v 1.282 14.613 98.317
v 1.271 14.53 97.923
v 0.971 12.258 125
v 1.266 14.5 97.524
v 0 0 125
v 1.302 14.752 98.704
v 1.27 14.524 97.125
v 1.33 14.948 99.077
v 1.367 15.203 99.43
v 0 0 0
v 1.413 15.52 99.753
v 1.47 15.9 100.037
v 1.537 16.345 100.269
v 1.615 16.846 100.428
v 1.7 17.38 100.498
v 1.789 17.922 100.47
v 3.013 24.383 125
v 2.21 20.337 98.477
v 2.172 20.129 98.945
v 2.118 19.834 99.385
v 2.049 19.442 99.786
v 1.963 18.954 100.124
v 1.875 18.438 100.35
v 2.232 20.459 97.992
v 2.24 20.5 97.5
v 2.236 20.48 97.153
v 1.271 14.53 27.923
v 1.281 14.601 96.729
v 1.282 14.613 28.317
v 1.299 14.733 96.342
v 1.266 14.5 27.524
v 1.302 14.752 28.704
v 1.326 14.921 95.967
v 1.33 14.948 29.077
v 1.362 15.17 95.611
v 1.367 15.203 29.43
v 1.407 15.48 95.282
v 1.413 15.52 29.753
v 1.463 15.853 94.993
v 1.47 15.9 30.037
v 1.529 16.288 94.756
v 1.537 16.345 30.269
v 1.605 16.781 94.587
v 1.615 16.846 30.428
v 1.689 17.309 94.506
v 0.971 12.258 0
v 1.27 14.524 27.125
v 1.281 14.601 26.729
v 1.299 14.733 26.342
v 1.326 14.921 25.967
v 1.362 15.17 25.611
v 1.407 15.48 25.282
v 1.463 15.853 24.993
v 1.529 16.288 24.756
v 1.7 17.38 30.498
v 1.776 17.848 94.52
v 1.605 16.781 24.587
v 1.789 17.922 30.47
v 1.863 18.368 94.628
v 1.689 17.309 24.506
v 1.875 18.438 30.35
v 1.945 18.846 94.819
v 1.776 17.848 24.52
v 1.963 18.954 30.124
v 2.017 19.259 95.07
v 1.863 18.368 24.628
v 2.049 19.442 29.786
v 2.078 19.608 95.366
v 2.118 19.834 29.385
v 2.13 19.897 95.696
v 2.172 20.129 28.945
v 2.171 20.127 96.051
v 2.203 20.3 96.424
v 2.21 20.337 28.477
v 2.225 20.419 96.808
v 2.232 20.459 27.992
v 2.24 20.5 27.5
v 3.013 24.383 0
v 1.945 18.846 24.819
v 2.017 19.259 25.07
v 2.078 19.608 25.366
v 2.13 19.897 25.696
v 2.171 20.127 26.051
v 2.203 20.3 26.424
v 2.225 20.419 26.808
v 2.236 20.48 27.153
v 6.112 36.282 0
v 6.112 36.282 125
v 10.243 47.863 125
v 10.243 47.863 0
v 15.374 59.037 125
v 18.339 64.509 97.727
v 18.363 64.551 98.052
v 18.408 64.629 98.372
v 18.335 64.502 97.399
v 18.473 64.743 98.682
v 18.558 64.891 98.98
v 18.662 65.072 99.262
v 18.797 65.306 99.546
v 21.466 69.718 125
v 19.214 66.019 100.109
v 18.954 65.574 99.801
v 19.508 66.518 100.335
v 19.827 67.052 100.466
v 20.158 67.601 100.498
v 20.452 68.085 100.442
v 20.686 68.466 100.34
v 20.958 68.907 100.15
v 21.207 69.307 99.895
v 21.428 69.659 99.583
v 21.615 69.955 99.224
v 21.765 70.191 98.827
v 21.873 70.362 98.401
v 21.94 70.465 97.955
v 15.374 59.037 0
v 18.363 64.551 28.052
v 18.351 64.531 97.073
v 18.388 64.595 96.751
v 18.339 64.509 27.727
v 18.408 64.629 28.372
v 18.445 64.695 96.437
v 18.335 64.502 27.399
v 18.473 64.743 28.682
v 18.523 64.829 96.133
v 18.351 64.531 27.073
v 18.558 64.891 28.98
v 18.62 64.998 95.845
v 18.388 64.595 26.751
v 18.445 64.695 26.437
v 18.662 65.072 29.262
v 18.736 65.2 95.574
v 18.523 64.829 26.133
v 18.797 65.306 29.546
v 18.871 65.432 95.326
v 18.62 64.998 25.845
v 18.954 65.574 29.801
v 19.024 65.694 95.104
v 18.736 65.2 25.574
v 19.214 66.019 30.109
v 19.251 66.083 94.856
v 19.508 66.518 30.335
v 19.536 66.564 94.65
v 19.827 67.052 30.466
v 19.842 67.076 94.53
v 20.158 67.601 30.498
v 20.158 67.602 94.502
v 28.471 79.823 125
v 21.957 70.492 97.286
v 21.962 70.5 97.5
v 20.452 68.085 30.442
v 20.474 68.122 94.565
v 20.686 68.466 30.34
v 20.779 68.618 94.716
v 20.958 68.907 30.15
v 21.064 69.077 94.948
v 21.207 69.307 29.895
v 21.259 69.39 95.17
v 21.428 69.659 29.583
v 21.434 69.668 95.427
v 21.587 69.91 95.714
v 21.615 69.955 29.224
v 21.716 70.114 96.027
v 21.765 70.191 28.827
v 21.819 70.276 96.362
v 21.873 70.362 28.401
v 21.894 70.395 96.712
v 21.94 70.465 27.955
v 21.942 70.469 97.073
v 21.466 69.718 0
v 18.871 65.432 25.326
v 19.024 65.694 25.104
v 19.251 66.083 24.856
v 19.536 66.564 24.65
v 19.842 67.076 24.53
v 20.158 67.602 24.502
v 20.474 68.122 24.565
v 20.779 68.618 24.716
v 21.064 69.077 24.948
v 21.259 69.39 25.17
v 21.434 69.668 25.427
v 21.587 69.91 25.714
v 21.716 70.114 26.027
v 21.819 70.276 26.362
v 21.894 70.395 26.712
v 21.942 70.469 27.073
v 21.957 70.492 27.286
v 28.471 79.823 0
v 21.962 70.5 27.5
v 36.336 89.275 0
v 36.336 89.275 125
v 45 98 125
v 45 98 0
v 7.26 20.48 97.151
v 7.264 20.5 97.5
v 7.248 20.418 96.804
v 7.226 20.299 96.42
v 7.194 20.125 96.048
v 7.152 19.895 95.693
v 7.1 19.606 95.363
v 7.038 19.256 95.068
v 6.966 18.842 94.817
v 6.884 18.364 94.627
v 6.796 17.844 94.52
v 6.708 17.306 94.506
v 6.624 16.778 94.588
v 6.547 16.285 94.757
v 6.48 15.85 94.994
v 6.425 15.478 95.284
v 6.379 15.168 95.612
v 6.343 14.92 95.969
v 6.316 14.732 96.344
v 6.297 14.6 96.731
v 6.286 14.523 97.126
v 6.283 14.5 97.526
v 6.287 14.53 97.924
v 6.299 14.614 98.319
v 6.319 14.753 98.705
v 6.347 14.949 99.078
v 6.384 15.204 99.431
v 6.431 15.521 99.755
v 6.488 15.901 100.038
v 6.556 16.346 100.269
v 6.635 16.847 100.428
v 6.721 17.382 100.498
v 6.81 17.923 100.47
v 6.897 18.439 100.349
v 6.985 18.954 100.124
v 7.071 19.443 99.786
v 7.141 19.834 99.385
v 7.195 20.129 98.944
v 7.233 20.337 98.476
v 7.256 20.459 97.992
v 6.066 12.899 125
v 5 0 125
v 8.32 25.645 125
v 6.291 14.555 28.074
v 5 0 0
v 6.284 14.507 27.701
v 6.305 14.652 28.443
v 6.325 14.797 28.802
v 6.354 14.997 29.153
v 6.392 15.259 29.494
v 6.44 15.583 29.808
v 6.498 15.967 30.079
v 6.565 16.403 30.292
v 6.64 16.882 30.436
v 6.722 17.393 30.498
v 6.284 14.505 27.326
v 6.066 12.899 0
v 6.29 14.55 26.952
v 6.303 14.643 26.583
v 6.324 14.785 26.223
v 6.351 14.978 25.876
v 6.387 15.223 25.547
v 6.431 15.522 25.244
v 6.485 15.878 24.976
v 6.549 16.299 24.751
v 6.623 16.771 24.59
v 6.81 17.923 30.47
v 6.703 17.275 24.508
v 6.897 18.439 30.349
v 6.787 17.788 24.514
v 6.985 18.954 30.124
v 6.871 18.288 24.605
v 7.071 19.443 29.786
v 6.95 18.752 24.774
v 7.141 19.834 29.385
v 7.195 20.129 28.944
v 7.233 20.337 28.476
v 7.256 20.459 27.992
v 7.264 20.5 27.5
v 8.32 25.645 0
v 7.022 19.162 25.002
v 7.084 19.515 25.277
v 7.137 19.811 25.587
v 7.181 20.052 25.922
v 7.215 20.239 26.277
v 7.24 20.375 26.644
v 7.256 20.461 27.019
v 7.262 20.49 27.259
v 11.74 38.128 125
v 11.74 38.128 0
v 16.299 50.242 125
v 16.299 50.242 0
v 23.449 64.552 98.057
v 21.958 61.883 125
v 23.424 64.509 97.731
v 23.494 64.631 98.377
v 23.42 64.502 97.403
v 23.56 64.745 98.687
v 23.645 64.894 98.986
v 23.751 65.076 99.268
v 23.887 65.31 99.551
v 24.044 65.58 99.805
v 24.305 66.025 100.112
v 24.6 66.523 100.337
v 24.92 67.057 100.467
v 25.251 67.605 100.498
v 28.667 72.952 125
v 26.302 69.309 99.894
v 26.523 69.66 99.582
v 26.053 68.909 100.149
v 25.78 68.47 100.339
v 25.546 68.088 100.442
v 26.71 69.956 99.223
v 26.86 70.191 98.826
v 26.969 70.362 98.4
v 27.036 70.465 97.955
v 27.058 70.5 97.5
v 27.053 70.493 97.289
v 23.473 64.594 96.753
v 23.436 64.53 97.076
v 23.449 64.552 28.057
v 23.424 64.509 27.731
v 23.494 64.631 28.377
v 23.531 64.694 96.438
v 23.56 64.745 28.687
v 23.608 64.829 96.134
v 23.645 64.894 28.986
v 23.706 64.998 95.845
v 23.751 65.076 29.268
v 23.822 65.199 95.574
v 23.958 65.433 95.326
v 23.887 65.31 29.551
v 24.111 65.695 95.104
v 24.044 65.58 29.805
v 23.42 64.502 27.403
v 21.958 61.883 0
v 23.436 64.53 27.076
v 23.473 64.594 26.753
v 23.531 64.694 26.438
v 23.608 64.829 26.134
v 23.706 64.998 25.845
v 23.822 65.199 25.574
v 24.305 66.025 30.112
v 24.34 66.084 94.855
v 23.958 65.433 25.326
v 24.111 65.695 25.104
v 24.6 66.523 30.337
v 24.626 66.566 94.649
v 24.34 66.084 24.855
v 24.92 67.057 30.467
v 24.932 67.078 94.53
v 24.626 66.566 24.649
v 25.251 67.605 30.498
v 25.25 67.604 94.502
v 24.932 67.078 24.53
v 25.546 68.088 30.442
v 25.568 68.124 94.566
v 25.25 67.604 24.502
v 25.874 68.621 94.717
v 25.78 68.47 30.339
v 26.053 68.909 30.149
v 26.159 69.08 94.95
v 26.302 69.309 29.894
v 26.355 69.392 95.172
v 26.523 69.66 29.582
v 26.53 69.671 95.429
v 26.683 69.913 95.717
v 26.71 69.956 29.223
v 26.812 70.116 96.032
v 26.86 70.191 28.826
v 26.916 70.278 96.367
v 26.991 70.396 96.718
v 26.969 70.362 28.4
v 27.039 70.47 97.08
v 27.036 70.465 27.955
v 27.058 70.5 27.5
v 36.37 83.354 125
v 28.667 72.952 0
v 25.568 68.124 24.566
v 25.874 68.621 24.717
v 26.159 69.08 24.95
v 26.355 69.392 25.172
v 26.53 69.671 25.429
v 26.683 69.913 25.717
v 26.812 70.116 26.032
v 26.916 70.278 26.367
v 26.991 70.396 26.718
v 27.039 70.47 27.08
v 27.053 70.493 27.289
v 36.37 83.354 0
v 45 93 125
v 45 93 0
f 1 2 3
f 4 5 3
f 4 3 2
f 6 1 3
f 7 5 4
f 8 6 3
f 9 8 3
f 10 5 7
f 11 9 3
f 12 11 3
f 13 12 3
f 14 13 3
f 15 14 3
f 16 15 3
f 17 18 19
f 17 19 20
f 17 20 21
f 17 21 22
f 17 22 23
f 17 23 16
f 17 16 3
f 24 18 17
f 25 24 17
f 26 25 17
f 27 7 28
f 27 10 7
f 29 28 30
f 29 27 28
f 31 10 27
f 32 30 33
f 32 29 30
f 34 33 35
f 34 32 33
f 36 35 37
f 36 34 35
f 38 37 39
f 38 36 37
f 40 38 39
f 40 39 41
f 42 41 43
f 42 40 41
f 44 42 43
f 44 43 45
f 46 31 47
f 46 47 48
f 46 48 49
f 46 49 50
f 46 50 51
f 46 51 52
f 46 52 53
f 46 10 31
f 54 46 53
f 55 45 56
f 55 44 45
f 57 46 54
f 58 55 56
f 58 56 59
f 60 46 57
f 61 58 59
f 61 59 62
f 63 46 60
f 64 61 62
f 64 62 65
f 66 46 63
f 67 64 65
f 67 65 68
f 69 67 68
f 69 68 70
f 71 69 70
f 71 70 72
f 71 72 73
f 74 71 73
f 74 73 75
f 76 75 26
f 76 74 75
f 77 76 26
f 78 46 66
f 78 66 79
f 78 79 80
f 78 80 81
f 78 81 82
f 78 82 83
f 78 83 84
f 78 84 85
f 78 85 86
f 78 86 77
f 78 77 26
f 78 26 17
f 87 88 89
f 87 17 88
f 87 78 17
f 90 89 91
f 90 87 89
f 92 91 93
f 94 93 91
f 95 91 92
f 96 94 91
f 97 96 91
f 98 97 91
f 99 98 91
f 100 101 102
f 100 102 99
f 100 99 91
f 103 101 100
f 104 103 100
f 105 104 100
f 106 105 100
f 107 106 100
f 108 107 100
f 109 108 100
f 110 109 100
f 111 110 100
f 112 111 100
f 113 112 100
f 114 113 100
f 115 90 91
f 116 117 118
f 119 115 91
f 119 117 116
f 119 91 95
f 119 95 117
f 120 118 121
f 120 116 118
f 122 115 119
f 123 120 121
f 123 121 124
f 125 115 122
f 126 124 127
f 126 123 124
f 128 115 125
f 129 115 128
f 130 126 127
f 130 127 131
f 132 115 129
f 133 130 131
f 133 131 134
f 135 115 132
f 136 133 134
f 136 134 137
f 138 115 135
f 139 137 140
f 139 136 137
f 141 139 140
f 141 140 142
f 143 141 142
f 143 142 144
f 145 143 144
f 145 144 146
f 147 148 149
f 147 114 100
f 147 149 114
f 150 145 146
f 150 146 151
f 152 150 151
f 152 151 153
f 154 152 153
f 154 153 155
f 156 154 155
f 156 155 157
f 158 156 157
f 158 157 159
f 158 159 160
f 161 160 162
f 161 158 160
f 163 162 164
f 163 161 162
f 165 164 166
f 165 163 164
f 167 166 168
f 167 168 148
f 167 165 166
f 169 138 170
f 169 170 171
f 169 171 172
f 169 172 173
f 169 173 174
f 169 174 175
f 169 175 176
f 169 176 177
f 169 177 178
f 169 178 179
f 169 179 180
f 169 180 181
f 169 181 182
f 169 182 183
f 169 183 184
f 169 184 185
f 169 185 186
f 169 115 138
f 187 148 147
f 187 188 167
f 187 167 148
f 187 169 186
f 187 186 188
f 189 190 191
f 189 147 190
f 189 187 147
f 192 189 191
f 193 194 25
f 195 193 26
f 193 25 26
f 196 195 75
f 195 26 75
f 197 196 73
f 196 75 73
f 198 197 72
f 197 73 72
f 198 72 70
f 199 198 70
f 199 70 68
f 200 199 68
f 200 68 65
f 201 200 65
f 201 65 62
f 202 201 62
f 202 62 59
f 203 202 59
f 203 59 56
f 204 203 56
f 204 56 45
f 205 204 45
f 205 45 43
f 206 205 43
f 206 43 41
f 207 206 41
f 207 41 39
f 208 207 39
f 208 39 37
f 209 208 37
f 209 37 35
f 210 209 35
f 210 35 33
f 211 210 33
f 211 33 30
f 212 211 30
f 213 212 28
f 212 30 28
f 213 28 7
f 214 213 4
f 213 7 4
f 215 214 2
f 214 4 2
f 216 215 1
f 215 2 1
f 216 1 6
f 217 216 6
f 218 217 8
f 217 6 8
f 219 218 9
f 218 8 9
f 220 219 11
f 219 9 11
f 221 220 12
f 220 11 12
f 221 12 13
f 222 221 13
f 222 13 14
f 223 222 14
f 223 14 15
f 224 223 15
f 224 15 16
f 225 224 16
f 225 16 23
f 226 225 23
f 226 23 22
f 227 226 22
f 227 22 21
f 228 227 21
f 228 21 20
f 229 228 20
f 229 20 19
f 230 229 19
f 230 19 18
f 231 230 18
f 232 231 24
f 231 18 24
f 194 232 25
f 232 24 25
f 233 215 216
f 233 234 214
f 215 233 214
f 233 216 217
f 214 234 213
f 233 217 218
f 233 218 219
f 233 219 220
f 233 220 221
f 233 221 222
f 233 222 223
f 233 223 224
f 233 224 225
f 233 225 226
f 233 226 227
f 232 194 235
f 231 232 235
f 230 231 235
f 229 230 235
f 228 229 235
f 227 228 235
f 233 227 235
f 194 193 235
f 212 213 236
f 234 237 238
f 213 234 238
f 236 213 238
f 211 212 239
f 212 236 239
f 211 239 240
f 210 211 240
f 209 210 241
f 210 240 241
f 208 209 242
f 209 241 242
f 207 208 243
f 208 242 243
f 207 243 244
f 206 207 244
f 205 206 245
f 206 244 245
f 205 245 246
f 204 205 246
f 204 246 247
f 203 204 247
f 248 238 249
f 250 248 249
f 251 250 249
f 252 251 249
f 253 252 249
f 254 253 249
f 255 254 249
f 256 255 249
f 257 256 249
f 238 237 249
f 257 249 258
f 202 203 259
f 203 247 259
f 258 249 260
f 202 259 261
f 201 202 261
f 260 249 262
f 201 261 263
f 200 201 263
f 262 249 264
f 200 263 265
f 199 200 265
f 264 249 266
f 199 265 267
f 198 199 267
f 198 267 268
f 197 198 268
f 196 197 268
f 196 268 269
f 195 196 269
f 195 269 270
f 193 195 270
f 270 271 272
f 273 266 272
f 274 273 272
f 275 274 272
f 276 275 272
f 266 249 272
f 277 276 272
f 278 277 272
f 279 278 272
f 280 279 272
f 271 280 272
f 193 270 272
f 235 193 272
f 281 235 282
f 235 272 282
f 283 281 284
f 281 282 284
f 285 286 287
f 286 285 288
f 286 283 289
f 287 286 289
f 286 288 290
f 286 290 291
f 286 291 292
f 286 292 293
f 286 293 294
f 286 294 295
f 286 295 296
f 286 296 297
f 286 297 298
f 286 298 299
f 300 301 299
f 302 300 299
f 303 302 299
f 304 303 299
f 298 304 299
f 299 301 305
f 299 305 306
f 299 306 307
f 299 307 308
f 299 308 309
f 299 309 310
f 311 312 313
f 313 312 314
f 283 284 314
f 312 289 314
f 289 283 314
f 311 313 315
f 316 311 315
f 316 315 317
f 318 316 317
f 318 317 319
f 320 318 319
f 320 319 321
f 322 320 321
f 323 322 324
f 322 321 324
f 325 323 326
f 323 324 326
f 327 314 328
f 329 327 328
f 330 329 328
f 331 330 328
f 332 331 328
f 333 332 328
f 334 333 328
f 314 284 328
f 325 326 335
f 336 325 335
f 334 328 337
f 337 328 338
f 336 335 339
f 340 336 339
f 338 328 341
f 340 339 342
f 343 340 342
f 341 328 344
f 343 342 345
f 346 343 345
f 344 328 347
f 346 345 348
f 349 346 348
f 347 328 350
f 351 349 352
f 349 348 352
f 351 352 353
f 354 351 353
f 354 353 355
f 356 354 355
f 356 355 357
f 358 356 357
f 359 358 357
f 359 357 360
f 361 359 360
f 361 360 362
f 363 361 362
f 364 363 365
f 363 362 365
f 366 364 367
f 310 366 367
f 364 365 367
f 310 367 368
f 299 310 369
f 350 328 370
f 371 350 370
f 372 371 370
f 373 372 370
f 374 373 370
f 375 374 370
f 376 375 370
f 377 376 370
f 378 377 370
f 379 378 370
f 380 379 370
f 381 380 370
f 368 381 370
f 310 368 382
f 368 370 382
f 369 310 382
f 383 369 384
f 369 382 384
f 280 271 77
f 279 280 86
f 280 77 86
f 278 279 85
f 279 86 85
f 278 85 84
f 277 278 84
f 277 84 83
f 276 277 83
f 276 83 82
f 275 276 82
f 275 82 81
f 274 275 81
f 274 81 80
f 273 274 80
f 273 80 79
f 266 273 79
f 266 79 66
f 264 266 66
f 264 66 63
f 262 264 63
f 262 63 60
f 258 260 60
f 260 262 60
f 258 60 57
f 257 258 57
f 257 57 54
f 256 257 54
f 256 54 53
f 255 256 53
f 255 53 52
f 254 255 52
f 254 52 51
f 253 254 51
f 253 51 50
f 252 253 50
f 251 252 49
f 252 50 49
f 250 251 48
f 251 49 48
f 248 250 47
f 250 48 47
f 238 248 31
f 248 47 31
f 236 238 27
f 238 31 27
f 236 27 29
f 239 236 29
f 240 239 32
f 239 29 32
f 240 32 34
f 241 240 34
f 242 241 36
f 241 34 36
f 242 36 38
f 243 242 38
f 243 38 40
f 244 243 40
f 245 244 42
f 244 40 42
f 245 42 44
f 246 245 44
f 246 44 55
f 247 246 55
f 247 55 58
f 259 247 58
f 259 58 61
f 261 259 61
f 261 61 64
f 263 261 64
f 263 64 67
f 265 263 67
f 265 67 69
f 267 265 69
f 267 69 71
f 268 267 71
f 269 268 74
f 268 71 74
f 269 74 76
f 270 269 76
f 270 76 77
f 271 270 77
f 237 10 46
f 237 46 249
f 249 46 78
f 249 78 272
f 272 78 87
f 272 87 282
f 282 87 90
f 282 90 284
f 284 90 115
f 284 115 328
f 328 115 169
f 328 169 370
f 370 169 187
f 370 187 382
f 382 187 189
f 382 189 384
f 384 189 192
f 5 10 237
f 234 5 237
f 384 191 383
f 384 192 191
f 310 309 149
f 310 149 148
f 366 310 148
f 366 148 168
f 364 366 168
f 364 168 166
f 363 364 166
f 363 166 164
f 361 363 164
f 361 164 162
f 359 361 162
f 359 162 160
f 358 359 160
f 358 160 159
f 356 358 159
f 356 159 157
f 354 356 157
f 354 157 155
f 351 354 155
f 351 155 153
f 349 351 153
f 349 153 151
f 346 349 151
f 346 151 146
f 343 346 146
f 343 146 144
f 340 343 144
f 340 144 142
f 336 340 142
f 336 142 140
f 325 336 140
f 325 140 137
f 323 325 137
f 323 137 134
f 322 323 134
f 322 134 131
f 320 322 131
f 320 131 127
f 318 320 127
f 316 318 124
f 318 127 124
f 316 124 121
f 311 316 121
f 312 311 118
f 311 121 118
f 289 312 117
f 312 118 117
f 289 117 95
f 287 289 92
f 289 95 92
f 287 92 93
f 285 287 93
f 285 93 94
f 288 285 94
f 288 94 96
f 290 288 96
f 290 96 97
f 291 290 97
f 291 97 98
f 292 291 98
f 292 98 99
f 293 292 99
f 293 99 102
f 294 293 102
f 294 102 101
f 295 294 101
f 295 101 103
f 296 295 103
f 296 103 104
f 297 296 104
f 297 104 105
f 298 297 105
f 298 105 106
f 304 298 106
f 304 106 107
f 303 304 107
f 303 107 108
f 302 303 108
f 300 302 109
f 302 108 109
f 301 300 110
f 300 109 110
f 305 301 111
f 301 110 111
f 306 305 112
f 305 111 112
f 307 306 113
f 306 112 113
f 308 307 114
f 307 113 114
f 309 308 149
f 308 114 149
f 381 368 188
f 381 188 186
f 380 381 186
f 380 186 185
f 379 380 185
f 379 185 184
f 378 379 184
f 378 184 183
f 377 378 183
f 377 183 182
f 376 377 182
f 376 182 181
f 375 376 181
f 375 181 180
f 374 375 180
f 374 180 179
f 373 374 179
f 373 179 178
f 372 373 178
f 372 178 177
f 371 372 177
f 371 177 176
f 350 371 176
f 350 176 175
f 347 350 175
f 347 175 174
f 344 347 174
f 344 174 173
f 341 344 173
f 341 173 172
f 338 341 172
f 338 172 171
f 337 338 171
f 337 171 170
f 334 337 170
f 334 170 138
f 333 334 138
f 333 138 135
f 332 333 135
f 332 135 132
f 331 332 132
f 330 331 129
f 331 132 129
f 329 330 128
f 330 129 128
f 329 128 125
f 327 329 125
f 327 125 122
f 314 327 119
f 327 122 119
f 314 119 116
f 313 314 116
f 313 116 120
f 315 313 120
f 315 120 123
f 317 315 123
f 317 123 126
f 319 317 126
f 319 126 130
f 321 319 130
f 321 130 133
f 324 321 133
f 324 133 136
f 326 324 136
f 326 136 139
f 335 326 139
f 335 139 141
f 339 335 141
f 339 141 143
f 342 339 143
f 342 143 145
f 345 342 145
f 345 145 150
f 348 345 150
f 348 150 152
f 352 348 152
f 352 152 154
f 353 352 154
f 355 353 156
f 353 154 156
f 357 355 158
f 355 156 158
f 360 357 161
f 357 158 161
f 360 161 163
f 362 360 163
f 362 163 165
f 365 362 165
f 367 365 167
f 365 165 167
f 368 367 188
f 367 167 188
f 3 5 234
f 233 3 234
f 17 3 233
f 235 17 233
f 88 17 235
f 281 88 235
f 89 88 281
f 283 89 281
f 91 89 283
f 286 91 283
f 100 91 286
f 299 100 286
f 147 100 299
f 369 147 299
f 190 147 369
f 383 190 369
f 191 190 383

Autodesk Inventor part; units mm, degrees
ref_plane "YZ Plane" through (0, 0, 0) normal (1, 0, 0) x (0, 1, 0)
ref_plane "XZ Plane" through (0, 0, 0) normal (0, 1, 0) x (-1, 0, 0)
ref_plane "XY Plane" through (0, 0, 0) normal (0, 0, 1) x (1, 0, 0)
sketch "Sketch1" plane through (0, 0, 0) normal (0, 0, 1) x (1, 0, 0)
  arc A0 (45, 98) -> (0, 0) centre (139.9137, -4.9145) ccw
  line L0 (45, 98) -> (45, 93)
  line L1 (0, 0) -> (5, 0)
  arc A1 (45, 93) -> (5, 0) centre (144.908, -5.0734) ccw
  dimension "d0" = 140
  dimension "d1" = 98
  dimension "d3" = 45
  dimension "d4" = 5
  dimension "d5" = 5
  dimension "d6" = 140
extrude "Extrusion1" add sketch "Sketch1" along normal blind 125
sketch "Sketch2" plane through (0, 0, 0) normal (1, 0, 0) x (0, 1, 0)
  circle A0 centre (67.5, 27.5) radius 3
  circle A1 centre (17.5, 27.5) radius 3
  line L0 (98, 0) -> (98, 125) projected
  circle A2 centre (67.5, 97.5) radius 3
  circle A3 centre (17.5, 97.5) radius 3
  point P0 (0, 0)
  dimension "d9" = 6
  dimension "d10" = 6
  dimension "d11" = 27.5
  dimension "d12" = 50
  dimension "d13" = 30.5
  dimension "d14" = 6
  dimension "d15" = 6
  dimension "d16" = 70
extrude "Extrusion2" cut sketch "Sketch2" along normal through all
properties part number "SJ009" material "ABS Plastic"
